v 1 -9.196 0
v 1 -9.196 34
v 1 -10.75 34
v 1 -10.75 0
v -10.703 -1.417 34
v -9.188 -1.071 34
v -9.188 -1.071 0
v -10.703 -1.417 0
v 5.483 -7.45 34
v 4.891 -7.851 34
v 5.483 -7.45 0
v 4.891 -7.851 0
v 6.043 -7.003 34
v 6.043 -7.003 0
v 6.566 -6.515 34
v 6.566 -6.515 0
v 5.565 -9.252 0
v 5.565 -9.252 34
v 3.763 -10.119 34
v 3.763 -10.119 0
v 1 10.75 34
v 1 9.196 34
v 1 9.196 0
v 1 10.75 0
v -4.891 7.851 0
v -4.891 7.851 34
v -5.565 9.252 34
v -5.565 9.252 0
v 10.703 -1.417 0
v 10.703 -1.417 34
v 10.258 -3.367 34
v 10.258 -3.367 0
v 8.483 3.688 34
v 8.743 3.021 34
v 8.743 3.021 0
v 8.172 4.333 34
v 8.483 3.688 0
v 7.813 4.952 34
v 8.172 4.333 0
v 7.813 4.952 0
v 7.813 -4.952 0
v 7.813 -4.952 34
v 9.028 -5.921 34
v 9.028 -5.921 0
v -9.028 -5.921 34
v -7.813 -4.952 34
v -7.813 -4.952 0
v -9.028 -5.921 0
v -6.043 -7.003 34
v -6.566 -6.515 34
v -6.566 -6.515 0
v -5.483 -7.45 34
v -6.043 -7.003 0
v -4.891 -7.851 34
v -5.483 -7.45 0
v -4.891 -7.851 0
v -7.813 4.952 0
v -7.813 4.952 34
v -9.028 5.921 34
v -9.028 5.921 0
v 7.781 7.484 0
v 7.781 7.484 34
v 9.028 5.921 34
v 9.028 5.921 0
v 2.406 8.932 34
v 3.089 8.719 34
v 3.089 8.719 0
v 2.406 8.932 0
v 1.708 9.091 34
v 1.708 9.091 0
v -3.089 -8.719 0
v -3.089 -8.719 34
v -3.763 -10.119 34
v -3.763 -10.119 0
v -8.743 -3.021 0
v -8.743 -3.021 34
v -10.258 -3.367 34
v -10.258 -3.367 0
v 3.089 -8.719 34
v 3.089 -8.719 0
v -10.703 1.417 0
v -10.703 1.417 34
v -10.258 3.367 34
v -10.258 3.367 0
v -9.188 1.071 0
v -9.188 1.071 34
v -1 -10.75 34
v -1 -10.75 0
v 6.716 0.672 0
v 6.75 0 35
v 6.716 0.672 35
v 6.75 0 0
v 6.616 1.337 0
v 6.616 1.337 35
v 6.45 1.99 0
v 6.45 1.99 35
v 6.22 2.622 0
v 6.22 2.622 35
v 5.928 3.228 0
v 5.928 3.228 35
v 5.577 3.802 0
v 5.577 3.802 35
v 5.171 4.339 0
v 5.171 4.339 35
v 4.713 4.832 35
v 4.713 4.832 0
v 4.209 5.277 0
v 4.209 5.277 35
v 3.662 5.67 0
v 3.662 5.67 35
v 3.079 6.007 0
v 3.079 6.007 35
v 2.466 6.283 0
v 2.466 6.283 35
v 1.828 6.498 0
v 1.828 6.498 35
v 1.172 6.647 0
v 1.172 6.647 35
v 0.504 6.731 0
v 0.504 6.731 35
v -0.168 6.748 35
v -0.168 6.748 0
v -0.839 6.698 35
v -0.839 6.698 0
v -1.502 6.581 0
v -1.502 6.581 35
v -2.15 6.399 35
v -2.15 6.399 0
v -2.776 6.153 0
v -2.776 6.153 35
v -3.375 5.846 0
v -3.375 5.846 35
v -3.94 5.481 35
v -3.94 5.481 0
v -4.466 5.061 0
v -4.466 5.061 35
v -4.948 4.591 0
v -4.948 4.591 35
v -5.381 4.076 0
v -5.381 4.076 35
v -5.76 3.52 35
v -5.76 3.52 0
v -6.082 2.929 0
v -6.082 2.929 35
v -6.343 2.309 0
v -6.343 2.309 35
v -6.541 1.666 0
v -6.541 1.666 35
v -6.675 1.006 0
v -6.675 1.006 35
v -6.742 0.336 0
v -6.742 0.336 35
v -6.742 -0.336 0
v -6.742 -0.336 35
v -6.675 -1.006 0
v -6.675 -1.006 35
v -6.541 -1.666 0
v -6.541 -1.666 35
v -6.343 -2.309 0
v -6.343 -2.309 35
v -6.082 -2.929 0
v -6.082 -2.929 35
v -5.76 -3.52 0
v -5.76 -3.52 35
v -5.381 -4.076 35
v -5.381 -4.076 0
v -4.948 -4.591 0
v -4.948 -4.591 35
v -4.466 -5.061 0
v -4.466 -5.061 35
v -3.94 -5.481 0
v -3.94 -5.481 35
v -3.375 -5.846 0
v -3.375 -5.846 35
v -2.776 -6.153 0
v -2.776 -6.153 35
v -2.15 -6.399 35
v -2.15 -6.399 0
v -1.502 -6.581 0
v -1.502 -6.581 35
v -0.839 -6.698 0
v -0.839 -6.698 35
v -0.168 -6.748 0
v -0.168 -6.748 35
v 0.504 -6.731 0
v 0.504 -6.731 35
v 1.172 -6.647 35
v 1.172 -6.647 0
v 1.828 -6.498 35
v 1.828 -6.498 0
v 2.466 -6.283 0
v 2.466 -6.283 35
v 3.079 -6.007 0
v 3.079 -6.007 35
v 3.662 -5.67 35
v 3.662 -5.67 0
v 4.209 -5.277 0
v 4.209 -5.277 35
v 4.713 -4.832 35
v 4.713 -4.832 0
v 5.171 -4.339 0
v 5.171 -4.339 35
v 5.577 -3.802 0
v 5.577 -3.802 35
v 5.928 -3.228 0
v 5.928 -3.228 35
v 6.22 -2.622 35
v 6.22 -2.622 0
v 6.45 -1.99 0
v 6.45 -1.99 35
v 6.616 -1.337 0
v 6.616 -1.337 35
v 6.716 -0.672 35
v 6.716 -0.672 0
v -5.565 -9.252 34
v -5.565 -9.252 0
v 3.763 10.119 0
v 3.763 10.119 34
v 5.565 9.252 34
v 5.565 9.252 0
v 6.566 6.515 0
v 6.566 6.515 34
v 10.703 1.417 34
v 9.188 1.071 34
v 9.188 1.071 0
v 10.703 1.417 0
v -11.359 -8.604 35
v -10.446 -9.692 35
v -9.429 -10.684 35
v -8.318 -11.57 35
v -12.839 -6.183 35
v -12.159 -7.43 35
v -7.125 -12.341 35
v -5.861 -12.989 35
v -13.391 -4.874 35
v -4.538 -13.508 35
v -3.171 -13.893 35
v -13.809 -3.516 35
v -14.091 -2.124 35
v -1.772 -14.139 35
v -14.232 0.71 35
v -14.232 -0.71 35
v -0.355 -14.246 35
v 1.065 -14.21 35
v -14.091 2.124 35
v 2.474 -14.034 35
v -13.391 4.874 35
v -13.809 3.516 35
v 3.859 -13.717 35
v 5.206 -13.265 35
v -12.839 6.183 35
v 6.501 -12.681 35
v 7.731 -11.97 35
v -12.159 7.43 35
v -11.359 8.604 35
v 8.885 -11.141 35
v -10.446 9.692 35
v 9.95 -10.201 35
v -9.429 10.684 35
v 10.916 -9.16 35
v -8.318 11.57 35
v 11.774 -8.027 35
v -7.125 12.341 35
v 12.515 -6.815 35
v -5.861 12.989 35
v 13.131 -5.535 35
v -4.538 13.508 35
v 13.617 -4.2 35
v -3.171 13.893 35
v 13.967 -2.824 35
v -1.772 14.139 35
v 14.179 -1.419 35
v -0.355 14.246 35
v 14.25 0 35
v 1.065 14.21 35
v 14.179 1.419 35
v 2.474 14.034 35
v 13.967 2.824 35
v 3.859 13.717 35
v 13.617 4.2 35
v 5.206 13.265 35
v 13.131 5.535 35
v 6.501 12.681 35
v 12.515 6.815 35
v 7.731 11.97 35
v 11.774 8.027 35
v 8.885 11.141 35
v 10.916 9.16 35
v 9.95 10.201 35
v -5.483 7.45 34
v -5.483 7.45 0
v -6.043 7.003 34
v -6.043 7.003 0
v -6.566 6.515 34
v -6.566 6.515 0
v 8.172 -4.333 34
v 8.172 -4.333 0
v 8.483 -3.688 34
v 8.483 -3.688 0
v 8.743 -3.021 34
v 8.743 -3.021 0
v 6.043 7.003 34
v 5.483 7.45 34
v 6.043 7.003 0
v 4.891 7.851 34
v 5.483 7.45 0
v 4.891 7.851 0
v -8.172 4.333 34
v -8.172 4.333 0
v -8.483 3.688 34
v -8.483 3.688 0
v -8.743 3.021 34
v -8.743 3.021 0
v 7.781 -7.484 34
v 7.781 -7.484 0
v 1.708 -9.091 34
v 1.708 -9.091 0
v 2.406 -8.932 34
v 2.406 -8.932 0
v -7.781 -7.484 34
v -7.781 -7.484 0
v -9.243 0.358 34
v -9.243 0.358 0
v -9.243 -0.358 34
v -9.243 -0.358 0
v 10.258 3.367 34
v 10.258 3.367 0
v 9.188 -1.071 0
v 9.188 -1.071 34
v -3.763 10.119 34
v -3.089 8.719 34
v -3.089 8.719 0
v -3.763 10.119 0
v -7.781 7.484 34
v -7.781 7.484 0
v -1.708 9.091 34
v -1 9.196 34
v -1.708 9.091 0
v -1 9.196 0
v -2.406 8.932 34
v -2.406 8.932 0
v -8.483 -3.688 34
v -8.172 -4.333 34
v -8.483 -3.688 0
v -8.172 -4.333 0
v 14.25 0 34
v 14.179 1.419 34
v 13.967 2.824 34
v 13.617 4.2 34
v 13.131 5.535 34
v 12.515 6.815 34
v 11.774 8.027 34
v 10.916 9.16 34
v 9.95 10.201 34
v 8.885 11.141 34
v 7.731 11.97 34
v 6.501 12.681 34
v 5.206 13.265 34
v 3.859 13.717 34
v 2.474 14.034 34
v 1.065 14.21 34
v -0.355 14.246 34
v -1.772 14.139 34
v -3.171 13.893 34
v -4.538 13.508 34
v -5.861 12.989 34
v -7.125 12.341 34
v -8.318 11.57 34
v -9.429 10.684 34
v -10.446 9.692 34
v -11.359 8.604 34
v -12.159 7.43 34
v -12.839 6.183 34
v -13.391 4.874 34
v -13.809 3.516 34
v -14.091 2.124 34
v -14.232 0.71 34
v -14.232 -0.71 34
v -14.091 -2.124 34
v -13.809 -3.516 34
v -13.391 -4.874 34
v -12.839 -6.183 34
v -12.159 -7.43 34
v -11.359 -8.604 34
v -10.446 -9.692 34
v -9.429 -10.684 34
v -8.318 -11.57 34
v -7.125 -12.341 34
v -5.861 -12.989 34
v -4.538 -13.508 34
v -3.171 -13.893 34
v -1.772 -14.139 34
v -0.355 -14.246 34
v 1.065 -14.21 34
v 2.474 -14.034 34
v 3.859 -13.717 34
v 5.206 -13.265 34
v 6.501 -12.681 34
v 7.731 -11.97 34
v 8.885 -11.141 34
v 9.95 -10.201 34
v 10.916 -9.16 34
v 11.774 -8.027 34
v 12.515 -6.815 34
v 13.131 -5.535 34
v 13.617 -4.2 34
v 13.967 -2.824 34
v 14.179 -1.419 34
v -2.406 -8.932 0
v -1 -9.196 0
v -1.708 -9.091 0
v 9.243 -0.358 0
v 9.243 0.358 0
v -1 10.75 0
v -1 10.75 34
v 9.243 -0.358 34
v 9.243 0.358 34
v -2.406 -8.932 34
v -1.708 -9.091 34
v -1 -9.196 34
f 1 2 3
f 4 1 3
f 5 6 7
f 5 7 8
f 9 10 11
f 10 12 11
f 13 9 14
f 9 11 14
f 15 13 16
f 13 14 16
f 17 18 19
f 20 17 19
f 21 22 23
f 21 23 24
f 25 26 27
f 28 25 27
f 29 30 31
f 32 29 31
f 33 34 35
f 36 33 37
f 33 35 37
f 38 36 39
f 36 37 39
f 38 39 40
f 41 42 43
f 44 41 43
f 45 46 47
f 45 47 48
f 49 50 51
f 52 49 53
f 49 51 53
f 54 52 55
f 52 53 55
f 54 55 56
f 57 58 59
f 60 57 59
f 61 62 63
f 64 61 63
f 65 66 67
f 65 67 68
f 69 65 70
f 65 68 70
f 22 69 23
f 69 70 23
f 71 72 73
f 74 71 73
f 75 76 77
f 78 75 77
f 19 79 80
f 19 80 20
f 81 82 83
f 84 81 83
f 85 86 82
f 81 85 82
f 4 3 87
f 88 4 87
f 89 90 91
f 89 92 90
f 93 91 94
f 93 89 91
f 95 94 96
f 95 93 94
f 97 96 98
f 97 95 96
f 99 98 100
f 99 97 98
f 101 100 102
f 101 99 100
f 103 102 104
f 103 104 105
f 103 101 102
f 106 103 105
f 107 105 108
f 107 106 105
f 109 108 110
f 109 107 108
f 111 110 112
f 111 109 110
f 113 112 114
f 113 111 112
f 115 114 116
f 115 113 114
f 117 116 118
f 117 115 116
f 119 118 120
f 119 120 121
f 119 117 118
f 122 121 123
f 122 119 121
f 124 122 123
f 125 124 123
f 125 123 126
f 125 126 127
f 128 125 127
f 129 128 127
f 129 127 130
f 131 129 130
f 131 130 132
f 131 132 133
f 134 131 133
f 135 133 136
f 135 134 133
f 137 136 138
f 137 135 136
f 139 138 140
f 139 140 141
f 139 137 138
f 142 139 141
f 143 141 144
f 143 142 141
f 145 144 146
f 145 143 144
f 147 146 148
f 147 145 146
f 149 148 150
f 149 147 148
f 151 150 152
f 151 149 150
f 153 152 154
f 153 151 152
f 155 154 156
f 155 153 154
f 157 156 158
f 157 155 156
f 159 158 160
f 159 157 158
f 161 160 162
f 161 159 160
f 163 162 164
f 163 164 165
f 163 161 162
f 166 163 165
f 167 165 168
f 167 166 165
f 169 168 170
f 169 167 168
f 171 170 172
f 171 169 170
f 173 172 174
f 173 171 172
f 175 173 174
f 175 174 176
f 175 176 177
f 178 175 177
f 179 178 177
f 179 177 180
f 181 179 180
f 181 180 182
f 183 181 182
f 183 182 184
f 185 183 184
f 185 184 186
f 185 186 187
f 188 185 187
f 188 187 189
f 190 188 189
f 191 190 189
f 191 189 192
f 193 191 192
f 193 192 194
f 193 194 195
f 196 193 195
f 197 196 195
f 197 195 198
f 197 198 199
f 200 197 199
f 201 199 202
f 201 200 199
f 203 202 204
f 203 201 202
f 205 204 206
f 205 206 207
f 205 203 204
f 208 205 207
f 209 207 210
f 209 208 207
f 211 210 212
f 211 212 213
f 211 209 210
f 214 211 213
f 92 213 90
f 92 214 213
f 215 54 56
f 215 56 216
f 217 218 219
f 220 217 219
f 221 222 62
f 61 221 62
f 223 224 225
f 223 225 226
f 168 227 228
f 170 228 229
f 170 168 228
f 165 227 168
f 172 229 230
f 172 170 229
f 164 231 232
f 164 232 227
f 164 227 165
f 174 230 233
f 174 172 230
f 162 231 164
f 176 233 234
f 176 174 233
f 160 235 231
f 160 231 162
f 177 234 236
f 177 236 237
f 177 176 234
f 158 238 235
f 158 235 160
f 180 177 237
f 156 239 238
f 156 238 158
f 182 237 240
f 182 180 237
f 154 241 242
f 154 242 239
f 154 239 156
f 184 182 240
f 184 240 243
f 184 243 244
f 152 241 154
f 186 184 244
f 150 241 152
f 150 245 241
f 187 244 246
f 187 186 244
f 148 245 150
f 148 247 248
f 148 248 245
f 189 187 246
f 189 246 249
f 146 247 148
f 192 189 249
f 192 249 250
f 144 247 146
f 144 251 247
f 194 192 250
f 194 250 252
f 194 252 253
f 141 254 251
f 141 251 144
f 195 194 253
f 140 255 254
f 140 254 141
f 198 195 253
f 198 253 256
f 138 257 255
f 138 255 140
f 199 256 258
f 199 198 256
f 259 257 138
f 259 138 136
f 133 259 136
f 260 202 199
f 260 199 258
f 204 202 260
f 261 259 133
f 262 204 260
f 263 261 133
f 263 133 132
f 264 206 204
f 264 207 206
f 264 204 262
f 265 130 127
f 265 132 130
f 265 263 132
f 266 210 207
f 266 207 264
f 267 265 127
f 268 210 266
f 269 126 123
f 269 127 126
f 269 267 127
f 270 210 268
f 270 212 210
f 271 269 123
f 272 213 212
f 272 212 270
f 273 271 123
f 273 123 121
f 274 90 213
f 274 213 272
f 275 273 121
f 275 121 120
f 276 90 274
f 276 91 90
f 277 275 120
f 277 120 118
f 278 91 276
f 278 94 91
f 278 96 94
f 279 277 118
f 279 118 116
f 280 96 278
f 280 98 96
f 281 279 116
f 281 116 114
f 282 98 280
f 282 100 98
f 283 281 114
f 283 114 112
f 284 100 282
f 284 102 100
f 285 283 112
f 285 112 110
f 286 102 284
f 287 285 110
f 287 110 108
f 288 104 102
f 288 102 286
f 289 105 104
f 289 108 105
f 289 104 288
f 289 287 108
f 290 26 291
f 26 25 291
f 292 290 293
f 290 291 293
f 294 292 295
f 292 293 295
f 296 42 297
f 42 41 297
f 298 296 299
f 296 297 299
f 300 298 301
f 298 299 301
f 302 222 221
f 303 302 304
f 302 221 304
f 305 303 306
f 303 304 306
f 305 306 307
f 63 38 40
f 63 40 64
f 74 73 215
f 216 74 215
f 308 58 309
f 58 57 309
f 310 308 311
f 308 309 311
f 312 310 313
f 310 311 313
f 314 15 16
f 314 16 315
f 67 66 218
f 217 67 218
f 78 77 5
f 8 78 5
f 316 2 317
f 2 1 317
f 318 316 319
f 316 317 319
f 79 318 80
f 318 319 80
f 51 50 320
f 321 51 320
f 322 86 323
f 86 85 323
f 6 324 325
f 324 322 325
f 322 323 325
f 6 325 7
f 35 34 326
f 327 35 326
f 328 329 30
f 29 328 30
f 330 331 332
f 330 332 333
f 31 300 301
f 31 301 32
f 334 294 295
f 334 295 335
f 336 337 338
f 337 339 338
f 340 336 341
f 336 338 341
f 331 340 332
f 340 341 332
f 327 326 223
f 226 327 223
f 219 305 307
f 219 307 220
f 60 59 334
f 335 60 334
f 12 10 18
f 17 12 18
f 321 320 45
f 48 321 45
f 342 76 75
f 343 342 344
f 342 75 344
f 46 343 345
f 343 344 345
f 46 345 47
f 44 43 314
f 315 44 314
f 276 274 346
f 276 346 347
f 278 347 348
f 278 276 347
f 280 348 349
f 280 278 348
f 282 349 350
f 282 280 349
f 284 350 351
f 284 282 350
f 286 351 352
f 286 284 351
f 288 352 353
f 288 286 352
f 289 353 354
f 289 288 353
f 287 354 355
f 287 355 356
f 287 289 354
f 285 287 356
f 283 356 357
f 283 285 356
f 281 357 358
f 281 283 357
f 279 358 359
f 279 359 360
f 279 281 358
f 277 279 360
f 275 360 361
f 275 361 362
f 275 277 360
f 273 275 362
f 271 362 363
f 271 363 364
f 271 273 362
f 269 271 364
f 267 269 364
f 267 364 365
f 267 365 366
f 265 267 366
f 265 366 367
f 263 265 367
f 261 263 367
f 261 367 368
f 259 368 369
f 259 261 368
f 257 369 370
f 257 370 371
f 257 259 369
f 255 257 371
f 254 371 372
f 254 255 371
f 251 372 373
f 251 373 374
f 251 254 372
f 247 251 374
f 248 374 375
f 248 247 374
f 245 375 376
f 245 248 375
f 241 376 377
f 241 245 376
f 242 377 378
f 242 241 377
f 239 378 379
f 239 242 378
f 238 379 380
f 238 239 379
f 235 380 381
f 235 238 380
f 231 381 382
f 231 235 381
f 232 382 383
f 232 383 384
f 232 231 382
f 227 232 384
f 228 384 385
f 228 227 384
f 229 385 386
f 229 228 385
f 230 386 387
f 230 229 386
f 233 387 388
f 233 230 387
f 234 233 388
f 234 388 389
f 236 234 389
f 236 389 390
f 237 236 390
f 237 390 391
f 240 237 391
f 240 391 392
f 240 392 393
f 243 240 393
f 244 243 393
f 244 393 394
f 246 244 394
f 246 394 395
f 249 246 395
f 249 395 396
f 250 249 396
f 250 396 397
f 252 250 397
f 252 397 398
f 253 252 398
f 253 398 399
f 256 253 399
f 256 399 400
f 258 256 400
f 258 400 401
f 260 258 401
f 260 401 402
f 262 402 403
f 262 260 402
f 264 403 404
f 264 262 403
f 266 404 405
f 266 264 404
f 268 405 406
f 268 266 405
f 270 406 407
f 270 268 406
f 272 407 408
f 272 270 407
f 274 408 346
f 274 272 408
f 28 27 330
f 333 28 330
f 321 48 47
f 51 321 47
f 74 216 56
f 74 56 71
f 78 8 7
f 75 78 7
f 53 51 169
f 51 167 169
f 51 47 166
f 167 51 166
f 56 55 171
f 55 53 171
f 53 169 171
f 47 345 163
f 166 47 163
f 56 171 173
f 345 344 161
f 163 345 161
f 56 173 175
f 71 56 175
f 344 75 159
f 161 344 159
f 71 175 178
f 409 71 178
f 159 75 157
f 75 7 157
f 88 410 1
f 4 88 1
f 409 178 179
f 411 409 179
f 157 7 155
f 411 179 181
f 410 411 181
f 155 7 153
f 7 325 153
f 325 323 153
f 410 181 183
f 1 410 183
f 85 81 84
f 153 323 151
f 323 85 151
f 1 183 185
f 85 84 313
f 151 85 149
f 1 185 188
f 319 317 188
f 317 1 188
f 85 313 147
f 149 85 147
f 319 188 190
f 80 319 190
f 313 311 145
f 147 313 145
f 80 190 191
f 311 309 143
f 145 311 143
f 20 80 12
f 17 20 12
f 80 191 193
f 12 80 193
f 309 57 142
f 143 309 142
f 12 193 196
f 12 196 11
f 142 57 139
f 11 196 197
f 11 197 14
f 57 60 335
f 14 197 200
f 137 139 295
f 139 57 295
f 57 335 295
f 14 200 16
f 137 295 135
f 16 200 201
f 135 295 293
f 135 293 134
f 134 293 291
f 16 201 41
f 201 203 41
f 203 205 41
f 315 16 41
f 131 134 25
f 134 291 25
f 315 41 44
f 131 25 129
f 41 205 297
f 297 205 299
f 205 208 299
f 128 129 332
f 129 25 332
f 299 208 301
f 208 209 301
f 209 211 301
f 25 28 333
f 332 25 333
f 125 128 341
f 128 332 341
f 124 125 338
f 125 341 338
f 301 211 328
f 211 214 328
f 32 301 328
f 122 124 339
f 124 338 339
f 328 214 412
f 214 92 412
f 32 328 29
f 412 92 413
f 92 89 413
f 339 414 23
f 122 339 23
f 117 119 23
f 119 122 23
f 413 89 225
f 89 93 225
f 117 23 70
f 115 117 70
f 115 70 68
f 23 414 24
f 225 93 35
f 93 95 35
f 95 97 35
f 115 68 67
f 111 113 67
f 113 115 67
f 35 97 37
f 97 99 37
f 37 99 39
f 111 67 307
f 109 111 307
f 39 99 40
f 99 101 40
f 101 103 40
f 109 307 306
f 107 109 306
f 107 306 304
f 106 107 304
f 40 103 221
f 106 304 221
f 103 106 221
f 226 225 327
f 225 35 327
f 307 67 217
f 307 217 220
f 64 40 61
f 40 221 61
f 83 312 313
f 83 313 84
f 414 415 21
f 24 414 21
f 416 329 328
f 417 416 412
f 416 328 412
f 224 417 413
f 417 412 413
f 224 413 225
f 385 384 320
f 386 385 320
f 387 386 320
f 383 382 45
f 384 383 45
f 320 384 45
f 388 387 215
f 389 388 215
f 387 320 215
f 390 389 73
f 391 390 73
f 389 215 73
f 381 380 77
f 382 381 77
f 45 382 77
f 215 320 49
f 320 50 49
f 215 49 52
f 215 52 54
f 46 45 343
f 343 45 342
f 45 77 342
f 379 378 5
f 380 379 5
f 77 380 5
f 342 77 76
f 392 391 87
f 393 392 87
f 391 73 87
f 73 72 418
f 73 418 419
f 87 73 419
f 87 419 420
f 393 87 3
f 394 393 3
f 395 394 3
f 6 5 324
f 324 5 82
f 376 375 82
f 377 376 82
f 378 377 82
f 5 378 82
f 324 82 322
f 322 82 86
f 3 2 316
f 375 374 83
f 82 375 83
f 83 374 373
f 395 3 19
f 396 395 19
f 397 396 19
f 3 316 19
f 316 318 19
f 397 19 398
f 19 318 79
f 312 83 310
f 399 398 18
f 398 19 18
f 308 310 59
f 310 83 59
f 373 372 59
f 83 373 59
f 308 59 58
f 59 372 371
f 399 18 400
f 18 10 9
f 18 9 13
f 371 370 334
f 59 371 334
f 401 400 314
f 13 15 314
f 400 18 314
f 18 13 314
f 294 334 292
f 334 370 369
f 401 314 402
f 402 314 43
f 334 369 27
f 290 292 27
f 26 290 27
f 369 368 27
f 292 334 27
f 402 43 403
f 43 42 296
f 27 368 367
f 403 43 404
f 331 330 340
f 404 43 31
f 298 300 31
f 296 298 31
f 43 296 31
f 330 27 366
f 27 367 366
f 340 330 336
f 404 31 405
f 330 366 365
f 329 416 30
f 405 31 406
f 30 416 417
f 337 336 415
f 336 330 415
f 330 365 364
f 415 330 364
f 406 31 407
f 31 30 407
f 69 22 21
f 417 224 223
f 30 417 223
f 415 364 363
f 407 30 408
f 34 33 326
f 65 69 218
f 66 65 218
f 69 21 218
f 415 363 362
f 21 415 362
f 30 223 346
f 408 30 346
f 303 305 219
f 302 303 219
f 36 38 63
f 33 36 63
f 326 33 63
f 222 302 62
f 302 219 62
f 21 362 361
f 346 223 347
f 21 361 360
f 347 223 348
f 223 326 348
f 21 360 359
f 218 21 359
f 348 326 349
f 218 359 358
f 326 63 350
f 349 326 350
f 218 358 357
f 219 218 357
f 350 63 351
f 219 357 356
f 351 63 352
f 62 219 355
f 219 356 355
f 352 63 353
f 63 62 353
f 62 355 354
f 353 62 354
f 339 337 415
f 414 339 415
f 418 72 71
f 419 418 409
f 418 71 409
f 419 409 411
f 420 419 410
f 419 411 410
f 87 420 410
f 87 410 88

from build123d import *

# Parameters (mm, degrees)
F0_R            = 9.25
F0_R_2          = 6.75
F1_DEPTH        = 35
F2_W            = 2
F2_H            = 3
F3_DEPTH        = 35
F3_COPIES_COUNT = 14
F4_R            = 14.25
F4_R_2          = 6.75
F5_DEPTH        = 1


# Not quite as in the source:
# - a pattern or mirror of a feature is missing from the dataset's text; its kind, count and spacing are read off the source's solid


with BuildPart() as f1:
    # F0 (on Top) → F1 (new body)
    with BuildSketch(Plane.XY):
        Circle(F0_R)
        Circle(F0_R_2, mode=Mode.SUBTRACT)
    extrude(amount=F1_DEPTH)

    # F2 (on face) → F3 (join)
    with BuildSketch(Plane.XY.offset(35)):
        with Locations((0, 9.25)):
            Rectangle(F2_W, F2_H)
    f3 = extrude(amount=-F3_DEPTH)

    # F3_copies: F3 ×14 about axis
    f3_copies_axis = Axis((0, 0, 0), (0, 0, 1))
    for i in range(1, F3_COPIES_COUNT):
        add(f3.rotate(f3_copies_axis, i * 360 / F3_COPIES_COUNT))

    # F4 (on face) → F5 (join)
    with BuildSketch(Plane.XY.offset(35)):
        Circle(F4_R)
        Circle(F4_R_2, mode=Mode.SUBTRACT)
    extrude(amount=-F5_DEPTH)


solid = f1.part
